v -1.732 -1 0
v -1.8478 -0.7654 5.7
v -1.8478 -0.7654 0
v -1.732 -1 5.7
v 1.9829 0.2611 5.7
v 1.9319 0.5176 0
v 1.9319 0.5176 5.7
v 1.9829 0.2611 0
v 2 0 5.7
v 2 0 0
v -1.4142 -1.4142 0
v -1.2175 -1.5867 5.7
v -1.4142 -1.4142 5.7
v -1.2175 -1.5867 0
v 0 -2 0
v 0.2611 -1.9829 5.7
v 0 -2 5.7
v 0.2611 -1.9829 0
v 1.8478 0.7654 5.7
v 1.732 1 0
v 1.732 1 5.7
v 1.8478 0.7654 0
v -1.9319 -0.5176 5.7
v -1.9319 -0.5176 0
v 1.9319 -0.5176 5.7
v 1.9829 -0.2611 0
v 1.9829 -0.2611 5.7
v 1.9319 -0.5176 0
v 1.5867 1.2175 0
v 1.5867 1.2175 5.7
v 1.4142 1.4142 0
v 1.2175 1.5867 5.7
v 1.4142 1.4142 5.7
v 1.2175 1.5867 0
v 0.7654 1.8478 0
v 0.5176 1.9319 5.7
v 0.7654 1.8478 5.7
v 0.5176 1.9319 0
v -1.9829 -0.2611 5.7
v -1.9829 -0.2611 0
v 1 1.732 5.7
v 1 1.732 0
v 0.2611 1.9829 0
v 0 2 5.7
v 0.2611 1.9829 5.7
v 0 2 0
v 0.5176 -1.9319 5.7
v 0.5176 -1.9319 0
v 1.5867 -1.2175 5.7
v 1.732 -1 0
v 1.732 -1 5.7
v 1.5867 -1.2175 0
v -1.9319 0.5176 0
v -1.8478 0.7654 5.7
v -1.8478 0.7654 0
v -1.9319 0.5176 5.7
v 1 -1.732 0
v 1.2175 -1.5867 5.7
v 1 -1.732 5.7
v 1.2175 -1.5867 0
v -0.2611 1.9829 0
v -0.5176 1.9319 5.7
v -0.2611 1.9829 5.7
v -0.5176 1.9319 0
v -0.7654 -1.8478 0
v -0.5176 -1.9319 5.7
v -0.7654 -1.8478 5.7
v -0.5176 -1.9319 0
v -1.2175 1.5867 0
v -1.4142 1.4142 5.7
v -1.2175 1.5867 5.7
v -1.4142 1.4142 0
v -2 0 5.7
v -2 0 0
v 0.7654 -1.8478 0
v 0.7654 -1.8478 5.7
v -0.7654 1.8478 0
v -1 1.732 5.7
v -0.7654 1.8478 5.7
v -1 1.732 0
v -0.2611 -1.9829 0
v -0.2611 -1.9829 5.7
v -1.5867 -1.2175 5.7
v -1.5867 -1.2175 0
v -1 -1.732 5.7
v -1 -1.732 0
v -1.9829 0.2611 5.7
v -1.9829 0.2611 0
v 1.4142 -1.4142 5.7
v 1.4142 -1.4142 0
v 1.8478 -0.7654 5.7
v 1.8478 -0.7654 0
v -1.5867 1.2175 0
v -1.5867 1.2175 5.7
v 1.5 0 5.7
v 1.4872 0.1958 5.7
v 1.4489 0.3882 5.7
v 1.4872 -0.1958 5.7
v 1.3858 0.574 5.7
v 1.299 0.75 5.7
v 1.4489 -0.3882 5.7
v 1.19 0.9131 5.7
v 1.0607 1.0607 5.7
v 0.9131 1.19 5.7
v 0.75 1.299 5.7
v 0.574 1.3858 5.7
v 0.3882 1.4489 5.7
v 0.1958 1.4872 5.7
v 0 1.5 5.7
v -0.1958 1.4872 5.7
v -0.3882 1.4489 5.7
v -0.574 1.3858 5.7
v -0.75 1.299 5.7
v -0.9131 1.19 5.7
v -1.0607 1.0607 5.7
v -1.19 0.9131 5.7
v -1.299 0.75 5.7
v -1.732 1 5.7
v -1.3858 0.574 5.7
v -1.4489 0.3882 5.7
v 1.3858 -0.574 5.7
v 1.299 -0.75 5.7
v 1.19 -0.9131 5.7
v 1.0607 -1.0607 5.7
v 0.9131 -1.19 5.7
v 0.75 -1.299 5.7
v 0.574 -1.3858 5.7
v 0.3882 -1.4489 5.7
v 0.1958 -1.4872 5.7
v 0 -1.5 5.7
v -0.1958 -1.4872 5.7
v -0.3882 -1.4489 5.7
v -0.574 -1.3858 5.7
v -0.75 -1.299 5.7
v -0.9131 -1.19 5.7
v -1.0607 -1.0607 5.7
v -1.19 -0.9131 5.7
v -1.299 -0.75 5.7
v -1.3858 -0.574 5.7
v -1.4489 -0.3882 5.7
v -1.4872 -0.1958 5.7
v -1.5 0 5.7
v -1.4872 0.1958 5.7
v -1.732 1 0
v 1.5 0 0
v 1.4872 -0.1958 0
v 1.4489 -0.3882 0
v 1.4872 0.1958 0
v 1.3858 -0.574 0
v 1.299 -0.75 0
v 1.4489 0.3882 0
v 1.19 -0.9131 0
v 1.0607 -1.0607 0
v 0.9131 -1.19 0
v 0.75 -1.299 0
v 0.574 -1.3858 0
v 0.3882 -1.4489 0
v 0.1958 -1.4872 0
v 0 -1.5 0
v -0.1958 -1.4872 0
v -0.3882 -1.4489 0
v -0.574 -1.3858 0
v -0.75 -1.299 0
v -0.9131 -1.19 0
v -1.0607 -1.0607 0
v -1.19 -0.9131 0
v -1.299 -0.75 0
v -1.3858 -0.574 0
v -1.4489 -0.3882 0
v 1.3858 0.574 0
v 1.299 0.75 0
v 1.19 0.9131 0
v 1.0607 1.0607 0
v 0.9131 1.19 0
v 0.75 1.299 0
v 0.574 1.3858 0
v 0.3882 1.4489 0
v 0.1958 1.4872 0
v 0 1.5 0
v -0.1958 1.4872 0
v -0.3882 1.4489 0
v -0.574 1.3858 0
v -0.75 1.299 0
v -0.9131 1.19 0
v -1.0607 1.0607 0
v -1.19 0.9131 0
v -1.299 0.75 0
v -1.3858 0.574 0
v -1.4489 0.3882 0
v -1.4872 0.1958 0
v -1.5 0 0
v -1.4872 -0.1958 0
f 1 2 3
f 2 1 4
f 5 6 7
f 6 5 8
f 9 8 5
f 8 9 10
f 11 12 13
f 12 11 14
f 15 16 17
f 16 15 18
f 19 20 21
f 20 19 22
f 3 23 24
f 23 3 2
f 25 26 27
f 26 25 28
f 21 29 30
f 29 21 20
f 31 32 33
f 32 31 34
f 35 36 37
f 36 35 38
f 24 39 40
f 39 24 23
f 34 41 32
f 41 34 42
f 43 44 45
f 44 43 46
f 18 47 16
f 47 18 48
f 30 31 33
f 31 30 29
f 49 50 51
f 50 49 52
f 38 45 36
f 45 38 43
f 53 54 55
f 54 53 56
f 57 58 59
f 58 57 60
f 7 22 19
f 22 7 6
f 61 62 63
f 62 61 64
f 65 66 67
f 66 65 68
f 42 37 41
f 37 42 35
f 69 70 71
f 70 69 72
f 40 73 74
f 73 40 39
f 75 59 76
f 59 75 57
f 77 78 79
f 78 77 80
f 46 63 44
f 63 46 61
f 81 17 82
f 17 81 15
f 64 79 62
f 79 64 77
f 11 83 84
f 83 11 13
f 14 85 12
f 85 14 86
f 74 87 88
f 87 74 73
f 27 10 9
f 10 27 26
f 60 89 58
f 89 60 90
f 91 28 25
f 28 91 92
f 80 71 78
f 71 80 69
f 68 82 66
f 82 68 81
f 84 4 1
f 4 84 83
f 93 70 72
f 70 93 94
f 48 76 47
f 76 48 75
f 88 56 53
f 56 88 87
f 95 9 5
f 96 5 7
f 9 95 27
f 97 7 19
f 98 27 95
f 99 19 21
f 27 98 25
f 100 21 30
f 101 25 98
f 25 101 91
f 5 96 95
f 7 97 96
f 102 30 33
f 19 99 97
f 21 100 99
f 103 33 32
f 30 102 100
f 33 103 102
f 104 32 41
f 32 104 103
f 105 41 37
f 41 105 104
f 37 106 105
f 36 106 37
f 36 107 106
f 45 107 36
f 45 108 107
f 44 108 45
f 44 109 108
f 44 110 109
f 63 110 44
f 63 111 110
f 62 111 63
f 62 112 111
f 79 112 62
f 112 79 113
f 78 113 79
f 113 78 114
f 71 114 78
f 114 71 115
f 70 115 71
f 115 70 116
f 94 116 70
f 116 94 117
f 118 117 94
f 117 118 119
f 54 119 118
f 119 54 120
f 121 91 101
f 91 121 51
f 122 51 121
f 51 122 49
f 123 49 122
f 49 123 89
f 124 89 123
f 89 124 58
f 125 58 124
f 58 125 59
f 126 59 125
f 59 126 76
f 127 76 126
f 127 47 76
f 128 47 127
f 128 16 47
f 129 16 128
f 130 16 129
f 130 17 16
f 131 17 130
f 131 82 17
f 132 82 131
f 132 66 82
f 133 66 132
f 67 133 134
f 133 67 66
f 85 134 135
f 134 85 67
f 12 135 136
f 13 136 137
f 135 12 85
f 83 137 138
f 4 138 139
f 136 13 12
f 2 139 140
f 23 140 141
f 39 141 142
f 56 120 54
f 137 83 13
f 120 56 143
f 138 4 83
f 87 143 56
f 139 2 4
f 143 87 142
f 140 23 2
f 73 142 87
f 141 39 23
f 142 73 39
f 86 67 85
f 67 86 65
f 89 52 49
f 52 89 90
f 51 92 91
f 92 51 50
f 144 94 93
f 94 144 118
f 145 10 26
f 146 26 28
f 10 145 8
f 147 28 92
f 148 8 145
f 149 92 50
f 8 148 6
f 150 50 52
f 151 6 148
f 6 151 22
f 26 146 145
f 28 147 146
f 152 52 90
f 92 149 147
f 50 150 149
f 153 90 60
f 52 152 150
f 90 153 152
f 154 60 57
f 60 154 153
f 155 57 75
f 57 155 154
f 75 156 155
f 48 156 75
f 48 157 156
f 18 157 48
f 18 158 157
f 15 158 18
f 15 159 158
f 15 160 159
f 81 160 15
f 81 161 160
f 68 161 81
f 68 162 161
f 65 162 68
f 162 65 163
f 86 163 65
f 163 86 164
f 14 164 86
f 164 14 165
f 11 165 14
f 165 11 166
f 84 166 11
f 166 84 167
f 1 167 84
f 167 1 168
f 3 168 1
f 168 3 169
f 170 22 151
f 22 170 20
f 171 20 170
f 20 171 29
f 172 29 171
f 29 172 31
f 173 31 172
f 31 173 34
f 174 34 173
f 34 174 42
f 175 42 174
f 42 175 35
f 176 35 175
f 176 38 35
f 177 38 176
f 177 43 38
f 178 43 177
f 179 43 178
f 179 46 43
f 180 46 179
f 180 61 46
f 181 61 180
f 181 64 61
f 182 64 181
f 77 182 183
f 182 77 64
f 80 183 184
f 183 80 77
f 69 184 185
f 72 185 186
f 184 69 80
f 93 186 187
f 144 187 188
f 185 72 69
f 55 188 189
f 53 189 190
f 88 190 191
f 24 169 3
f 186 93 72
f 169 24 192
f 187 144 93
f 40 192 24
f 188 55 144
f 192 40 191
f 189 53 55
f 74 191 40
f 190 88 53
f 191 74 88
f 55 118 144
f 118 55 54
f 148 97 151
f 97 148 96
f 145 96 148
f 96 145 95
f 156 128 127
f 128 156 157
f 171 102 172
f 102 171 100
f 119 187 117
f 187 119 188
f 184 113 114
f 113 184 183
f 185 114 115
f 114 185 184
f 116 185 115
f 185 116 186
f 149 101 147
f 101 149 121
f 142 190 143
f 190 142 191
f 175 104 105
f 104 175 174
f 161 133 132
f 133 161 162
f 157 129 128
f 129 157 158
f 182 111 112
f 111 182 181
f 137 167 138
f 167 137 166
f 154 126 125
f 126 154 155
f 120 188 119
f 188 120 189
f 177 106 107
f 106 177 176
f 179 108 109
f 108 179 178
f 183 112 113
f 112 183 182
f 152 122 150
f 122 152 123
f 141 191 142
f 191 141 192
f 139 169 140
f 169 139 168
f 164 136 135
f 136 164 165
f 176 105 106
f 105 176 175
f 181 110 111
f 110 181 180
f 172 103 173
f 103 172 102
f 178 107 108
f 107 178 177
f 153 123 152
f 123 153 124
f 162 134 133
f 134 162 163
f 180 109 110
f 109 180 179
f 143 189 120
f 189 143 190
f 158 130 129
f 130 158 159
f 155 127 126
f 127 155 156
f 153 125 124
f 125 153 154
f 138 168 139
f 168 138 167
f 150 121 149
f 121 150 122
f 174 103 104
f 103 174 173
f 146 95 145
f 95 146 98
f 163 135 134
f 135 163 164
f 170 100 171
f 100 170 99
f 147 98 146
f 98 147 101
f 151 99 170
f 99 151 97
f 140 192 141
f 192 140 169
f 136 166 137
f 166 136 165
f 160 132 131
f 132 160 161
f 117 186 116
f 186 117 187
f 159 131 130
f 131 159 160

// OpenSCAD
// A heat-set insert of the parts library (packages/contracts/src/parts/inserts.ts), as installed, given as -D overrides. `npm run
// check:assembly` renders it to check the inserts a model holds (e.g. the litter shovel's handle reinforcement). Melted in, the
// insert fills the printed hole it was pushed into, so it is drawn as that hole's diameter (HOLE, not its wider knurls), L long,
// with its bore at the thread's diameter; the screw in it is drawn at its minor diameter (parts/screws/screw.scad).
// Frame: millimetres, as the parts library's preview: its leading end on z = 0, the axis along Z.

HOLE = 4;
L = 5.7;
D = 3;

difference() {
  cylinder(d = HOLE, h = L, $fn = 48);
  translate([0, 0, -1]) cylinder(d = D, h = L + 2, $fn = 48);
}
